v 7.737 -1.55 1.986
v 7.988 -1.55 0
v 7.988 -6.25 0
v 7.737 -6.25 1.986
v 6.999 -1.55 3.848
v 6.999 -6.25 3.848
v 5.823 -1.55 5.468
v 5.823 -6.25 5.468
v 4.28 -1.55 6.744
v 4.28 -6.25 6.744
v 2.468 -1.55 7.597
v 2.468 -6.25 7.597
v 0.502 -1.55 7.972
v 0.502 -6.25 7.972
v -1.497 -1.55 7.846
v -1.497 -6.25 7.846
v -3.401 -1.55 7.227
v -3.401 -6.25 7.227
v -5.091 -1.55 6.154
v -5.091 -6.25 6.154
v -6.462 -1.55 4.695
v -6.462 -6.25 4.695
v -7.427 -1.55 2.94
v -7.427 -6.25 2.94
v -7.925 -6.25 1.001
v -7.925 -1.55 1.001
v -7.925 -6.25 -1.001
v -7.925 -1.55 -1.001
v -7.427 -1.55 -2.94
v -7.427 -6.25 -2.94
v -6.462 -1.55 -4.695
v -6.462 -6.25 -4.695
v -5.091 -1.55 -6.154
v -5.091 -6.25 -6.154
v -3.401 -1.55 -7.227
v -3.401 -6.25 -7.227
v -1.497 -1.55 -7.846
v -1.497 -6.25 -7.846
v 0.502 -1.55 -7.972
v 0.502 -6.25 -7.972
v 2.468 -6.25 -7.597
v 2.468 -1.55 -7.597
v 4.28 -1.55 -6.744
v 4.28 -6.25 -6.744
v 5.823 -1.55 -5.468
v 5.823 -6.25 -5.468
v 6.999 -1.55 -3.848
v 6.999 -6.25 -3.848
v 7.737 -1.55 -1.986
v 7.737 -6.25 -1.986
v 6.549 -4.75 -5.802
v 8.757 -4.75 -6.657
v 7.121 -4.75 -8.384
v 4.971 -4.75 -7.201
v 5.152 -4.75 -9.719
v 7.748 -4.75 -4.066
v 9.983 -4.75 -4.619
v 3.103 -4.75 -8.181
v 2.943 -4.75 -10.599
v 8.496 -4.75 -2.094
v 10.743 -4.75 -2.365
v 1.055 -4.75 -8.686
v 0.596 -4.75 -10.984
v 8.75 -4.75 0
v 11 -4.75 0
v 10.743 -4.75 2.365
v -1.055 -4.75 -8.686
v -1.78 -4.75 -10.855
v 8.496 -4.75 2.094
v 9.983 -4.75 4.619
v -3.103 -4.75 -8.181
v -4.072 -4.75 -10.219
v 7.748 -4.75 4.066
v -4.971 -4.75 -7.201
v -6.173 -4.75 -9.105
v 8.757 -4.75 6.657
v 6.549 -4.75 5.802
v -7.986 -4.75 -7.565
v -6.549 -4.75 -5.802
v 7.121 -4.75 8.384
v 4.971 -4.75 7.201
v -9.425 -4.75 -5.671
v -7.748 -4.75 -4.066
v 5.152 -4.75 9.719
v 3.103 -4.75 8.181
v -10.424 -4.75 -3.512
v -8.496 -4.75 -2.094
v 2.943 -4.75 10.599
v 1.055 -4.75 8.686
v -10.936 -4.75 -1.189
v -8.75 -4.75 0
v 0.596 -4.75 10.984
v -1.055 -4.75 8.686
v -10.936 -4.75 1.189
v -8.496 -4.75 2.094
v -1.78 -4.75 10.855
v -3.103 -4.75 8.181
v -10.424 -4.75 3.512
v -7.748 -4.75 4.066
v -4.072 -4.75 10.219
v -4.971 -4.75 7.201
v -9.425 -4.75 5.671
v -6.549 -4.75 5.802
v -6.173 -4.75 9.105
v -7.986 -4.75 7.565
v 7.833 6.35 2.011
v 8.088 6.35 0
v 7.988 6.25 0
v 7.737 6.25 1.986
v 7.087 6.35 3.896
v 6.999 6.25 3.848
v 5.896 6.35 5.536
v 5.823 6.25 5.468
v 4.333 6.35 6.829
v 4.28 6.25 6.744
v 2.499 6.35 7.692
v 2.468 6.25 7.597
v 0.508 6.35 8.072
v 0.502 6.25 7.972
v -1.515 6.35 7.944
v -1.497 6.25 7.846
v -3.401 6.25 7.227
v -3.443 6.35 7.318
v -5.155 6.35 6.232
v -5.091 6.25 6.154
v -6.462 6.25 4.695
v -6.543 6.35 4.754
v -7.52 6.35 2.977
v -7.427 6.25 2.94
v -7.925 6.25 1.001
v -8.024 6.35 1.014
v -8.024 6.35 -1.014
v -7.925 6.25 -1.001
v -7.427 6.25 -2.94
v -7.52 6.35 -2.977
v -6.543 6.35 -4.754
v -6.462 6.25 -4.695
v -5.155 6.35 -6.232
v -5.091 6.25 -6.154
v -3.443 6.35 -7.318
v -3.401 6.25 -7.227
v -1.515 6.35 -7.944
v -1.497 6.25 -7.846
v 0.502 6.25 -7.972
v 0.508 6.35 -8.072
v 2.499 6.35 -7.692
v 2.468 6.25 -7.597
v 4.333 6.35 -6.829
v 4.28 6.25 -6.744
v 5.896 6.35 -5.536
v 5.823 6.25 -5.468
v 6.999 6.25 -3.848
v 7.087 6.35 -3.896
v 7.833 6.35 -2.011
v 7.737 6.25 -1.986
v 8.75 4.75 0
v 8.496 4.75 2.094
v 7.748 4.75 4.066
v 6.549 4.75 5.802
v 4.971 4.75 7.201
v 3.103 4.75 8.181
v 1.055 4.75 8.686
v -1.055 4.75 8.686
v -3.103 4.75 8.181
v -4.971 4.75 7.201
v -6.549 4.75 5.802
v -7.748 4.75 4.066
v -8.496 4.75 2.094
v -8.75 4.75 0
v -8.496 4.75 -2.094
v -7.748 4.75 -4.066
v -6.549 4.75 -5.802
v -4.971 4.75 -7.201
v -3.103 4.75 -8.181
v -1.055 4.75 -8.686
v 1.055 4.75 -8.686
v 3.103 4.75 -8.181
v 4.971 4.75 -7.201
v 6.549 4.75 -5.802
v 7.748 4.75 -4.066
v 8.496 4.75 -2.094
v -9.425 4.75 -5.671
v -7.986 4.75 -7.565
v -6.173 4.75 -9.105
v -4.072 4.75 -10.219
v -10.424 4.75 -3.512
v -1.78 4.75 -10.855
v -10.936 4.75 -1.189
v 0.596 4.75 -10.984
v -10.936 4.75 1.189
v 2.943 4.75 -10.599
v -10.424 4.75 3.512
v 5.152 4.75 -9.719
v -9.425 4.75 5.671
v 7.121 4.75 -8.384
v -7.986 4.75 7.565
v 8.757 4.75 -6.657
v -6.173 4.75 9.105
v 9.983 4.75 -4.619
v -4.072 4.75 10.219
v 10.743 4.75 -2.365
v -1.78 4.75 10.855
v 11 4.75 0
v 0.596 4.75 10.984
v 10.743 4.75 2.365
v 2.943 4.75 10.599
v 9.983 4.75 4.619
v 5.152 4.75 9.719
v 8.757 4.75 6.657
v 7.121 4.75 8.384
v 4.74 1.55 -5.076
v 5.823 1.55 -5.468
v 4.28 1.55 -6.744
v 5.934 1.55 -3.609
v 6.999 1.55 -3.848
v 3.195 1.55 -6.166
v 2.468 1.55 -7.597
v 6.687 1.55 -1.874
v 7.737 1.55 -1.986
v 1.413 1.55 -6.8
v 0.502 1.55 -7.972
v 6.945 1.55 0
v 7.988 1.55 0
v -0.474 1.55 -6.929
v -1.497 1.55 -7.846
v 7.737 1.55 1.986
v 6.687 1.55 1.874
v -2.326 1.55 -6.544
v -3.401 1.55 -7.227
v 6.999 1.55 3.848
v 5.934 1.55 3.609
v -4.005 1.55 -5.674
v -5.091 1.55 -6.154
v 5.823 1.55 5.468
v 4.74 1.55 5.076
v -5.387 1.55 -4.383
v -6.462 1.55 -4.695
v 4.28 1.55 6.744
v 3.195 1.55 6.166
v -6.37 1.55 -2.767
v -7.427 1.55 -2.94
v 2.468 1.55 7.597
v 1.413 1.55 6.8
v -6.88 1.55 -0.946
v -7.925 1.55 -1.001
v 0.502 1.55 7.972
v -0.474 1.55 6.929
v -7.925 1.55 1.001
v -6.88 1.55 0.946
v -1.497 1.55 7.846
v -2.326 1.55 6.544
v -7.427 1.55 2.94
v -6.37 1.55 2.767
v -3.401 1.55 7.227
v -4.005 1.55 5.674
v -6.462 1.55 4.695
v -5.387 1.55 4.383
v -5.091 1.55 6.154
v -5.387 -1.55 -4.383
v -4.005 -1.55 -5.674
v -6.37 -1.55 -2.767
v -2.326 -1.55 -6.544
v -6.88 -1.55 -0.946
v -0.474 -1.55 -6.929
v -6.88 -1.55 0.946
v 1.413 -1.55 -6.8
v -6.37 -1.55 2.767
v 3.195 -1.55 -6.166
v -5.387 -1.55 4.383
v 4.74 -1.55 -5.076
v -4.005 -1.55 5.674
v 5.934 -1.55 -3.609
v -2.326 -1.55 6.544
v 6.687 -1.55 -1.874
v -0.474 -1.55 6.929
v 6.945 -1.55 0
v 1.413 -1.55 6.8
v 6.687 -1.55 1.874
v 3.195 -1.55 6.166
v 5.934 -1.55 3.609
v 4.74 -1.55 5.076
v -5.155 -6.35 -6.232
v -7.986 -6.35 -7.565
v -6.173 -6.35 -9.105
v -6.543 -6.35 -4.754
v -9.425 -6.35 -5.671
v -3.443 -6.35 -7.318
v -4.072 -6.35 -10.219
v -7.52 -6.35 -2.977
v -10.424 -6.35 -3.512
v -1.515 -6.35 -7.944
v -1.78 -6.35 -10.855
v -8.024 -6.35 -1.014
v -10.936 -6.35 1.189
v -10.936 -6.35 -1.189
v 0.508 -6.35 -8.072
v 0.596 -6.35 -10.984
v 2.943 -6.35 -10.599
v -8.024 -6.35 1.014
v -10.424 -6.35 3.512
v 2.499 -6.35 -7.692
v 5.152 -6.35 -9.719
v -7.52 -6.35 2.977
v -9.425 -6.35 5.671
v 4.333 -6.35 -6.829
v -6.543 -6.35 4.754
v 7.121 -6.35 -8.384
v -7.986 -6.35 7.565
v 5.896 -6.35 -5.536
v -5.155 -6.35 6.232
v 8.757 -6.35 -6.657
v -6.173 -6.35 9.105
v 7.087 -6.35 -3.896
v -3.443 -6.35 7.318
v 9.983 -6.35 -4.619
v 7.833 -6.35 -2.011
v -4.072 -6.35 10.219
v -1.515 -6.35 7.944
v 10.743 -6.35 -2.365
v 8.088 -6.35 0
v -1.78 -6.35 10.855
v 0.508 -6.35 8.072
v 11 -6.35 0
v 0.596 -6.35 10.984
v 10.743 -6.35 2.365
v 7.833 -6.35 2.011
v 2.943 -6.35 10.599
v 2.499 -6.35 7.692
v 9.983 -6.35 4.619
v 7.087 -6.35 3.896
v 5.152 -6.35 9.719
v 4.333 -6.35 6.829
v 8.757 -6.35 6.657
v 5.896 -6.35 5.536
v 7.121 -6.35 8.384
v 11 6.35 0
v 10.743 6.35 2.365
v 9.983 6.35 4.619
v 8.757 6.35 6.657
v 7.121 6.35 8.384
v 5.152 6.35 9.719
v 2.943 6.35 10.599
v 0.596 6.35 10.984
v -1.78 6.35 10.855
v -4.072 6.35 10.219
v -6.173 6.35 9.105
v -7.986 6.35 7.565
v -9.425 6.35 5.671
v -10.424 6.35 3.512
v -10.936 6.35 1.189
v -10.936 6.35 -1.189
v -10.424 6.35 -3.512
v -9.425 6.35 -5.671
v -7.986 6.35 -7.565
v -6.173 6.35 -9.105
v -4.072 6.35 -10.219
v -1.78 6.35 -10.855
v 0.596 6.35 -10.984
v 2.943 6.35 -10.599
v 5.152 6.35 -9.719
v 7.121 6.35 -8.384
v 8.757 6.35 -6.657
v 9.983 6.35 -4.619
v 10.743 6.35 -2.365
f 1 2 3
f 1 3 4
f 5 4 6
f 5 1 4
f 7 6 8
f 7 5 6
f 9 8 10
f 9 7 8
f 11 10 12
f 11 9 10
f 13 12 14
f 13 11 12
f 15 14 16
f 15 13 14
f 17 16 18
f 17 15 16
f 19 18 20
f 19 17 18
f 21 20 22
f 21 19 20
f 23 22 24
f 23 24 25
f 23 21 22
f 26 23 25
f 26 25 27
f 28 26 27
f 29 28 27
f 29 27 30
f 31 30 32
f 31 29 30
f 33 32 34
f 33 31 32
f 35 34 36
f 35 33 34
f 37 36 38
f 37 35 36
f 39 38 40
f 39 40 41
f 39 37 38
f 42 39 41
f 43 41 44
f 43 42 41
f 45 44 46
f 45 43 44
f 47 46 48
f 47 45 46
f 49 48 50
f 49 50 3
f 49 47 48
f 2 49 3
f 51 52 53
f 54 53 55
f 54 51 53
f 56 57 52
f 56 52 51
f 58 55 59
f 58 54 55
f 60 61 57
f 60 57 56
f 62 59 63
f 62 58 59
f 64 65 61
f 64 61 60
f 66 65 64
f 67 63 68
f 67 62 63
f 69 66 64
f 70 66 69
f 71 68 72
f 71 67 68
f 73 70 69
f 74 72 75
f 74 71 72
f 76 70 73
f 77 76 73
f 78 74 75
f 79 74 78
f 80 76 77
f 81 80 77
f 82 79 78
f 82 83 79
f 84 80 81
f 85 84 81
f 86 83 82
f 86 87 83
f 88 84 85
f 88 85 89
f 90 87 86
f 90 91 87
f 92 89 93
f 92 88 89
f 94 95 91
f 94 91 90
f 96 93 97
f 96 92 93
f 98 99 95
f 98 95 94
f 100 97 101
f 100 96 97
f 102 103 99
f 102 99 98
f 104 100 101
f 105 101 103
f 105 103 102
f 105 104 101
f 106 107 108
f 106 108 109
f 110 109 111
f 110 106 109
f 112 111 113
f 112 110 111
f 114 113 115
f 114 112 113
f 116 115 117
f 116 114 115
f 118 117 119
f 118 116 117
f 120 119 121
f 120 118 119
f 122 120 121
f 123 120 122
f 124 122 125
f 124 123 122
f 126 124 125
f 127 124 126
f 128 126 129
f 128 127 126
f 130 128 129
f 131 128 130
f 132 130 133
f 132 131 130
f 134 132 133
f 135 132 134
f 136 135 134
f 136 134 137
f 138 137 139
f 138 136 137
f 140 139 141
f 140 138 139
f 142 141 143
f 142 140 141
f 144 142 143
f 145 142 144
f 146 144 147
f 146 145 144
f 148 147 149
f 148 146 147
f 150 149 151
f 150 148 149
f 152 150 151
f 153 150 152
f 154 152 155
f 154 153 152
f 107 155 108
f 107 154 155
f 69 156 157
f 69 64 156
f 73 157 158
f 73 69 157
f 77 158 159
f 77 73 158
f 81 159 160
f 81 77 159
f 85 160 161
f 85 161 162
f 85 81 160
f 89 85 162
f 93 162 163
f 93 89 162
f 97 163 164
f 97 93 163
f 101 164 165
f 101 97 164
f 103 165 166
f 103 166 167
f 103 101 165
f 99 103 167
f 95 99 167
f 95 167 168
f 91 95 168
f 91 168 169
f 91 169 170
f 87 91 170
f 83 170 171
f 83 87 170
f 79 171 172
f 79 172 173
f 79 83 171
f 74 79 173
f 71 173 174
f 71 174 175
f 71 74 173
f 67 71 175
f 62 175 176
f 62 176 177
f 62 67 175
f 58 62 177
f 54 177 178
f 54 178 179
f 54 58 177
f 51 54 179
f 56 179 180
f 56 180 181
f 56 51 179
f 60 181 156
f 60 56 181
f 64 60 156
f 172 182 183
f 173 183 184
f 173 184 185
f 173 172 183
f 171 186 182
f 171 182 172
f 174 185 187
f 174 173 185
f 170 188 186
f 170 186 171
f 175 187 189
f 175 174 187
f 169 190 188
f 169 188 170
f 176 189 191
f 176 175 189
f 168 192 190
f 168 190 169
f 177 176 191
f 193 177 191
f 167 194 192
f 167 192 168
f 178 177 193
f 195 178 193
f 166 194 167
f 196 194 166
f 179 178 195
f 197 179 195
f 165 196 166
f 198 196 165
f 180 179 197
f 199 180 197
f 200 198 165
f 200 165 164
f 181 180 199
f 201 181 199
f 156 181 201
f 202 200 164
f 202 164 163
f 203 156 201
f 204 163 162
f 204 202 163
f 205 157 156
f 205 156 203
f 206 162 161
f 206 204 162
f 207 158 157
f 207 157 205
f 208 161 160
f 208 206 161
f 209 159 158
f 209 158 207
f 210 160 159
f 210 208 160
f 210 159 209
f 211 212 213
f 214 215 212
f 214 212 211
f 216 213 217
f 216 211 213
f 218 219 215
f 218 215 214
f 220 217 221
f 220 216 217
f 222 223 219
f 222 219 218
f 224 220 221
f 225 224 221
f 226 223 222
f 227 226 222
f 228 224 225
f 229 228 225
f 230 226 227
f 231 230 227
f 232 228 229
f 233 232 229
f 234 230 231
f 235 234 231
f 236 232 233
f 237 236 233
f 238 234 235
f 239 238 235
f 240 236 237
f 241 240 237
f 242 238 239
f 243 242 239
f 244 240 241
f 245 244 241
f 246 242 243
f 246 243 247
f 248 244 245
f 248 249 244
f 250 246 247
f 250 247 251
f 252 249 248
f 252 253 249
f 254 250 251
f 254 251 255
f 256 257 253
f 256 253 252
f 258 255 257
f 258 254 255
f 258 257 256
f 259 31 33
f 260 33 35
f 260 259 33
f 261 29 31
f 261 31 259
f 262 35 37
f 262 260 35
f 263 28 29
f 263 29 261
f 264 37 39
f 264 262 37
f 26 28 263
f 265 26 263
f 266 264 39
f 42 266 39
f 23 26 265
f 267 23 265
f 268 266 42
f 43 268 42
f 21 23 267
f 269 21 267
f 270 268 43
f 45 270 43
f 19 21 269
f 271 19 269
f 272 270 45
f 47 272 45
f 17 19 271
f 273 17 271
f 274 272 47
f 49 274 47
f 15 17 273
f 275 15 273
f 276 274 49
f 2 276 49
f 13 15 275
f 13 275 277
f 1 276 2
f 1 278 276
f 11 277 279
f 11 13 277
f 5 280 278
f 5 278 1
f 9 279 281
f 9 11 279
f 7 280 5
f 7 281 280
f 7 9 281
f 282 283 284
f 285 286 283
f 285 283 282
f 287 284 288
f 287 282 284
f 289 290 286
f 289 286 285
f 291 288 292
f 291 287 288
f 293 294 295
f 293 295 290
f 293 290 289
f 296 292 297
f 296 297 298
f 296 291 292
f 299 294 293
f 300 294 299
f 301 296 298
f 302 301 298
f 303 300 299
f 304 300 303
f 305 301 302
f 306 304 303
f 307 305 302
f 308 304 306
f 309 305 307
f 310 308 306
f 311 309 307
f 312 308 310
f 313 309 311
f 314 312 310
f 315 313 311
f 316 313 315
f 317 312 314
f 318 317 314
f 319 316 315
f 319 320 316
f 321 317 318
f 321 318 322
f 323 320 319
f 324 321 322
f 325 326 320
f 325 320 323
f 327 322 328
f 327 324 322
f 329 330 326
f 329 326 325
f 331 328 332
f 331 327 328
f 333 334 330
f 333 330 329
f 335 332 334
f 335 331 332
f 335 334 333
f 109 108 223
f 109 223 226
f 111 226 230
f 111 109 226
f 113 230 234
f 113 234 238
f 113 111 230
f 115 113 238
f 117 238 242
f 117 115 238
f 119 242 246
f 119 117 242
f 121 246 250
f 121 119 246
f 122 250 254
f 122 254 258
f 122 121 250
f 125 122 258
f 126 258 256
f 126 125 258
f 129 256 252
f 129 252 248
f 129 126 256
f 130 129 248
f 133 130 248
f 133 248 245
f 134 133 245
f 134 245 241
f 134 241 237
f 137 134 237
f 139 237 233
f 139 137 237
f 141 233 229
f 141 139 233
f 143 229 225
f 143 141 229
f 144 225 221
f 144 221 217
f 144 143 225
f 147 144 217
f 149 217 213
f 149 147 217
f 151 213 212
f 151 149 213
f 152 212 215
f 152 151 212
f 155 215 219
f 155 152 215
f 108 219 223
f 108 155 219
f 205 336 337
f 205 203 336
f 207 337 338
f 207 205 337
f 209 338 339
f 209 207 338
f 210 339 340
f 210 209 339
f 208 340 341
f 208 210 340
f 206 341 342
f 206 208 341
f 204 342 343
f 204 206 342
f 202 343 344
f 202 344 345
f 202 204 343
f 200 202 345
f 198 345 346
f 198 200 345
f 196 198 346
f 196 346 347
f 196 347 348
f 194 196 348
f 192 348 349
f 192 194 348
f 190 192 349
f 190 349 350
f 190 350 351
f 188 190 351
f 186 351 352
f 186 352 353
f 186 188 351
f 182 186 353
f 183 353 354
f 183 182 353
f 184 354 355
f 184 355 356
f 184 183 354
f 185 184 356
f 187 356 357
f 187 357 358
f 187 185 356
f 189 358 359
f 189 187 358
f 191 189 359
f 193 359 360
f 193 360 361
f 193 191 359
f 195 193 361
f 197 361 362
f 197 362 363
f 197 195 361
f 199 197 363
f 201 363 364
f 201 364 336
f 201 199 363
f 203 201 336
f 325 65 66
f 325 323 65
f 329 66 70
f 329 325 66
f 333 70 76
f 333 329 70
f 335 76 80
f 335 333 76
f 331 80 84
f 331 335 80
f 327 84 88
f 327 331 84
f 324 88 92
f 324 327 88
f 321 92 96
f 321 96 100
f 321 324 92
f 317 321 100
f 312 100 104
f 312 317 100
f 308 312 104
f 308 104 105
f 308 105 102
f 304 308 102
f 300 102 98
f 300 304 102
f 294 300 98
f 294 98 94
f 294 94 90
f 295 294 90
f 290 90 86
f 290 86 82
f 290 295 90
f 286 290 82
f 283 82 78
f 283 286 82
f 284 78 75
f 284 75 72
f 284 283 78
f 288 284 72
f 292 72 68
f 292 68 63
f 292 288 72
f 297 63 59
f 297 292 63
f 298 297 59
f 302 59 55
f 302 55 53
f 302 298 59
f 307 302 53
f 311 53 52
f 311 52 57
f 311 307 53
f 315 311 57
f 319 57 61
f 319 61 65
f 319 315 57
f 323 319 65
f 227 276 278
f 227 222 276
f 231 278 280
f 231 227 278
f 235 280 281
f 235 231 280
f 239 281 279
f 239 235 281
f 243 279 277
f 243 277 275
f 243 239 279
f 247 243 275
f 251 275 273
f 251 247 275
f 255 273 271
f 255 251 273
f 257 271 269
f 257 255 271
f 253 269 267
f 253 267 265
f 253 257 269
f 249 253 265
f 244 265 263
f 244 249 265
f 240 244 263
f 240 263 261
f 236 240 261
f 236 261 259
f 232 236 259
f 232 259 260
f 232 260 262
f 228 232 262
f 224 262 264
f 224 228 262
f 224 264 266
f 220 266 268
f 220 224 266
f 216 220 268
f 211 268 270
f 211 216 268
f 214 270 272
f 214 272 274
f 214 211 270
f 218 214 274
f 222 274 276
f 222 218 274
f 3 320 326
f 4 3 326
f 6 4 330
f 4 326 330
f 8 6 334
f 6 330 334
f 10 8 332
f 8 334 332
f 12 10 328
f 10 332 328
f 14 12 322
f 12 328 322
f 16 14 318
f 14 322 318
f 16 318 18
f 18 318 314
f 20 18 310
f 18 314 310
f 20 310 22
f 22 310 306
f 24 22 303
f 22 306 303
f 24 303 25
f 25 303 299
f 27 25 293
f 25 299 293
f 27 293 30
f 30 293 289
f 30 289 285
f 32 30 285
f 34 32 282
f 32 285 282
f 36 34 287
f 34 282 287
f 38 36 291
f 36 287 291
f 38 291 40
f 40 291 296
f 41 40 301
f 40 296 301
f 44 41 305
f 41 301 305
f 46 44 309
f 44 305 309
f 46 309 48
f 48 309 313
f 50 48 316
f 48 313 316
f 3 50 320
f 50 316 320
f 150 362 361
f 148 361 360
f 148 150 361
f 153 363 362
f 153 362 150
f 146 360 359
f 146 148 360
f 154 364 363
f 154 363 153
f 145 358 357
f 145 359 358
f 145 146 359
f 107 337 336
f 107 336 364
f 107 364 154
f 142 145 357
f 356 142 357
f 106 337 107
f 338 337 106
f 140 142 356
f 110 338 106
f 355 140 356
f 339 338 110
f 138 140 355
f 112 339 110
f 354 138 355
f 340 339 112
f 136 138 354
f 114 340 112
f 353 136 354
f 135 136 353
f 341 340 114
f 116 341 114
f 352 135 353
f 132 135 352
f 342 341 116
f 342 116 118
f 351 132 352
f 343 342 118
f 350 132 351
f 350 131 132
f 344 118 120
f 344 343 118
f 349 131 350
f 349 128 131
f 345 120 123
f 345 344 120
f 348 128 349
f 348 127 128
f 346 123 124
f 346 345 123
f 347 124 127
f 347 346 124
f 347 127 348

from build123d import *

# Parameters (mm, degrees)
CHAMFER1_SIZE = 0.1
CHAMFER2_SIZE = 0.1


with BuildPart() as part:
    # Sketch2 → Revolve1 (revolve)
    with BuildSketch(Plane.XY):
        Polygon((6.945, -1.55), (6.945, 1.55), (7.9875, 1.55), (7.9875, 6.35), (11, 6.35), (11, 4.75), (8.75, 4.75), (8.75, -4.75), (11, -4.75), (11, -6.35), (7.9875, -6.35), (7.9875, -1.55), align=None)
    revolve(axis=Axis((0, 30.498149714, 0), (0, -1, 0)))

    # Chamfer1
    chamfer1_edges = [part.edges().sort_by_distance(p)[0] for p in [
        (-7.9875, 6.35, 0),
    ]]
    chamfer(chamfer1_edges, length=CHAMFER1_SIZE)

    # Chamfer2
    chamfer2_edges = [part.edges().sort_by_distance(p)[0] for p in [
        (-7.9875, -6.35, 0),
    ]]
    chamfer(chamfer2_edges, length=CHAMFER2_SIZE)


solid = part.part
